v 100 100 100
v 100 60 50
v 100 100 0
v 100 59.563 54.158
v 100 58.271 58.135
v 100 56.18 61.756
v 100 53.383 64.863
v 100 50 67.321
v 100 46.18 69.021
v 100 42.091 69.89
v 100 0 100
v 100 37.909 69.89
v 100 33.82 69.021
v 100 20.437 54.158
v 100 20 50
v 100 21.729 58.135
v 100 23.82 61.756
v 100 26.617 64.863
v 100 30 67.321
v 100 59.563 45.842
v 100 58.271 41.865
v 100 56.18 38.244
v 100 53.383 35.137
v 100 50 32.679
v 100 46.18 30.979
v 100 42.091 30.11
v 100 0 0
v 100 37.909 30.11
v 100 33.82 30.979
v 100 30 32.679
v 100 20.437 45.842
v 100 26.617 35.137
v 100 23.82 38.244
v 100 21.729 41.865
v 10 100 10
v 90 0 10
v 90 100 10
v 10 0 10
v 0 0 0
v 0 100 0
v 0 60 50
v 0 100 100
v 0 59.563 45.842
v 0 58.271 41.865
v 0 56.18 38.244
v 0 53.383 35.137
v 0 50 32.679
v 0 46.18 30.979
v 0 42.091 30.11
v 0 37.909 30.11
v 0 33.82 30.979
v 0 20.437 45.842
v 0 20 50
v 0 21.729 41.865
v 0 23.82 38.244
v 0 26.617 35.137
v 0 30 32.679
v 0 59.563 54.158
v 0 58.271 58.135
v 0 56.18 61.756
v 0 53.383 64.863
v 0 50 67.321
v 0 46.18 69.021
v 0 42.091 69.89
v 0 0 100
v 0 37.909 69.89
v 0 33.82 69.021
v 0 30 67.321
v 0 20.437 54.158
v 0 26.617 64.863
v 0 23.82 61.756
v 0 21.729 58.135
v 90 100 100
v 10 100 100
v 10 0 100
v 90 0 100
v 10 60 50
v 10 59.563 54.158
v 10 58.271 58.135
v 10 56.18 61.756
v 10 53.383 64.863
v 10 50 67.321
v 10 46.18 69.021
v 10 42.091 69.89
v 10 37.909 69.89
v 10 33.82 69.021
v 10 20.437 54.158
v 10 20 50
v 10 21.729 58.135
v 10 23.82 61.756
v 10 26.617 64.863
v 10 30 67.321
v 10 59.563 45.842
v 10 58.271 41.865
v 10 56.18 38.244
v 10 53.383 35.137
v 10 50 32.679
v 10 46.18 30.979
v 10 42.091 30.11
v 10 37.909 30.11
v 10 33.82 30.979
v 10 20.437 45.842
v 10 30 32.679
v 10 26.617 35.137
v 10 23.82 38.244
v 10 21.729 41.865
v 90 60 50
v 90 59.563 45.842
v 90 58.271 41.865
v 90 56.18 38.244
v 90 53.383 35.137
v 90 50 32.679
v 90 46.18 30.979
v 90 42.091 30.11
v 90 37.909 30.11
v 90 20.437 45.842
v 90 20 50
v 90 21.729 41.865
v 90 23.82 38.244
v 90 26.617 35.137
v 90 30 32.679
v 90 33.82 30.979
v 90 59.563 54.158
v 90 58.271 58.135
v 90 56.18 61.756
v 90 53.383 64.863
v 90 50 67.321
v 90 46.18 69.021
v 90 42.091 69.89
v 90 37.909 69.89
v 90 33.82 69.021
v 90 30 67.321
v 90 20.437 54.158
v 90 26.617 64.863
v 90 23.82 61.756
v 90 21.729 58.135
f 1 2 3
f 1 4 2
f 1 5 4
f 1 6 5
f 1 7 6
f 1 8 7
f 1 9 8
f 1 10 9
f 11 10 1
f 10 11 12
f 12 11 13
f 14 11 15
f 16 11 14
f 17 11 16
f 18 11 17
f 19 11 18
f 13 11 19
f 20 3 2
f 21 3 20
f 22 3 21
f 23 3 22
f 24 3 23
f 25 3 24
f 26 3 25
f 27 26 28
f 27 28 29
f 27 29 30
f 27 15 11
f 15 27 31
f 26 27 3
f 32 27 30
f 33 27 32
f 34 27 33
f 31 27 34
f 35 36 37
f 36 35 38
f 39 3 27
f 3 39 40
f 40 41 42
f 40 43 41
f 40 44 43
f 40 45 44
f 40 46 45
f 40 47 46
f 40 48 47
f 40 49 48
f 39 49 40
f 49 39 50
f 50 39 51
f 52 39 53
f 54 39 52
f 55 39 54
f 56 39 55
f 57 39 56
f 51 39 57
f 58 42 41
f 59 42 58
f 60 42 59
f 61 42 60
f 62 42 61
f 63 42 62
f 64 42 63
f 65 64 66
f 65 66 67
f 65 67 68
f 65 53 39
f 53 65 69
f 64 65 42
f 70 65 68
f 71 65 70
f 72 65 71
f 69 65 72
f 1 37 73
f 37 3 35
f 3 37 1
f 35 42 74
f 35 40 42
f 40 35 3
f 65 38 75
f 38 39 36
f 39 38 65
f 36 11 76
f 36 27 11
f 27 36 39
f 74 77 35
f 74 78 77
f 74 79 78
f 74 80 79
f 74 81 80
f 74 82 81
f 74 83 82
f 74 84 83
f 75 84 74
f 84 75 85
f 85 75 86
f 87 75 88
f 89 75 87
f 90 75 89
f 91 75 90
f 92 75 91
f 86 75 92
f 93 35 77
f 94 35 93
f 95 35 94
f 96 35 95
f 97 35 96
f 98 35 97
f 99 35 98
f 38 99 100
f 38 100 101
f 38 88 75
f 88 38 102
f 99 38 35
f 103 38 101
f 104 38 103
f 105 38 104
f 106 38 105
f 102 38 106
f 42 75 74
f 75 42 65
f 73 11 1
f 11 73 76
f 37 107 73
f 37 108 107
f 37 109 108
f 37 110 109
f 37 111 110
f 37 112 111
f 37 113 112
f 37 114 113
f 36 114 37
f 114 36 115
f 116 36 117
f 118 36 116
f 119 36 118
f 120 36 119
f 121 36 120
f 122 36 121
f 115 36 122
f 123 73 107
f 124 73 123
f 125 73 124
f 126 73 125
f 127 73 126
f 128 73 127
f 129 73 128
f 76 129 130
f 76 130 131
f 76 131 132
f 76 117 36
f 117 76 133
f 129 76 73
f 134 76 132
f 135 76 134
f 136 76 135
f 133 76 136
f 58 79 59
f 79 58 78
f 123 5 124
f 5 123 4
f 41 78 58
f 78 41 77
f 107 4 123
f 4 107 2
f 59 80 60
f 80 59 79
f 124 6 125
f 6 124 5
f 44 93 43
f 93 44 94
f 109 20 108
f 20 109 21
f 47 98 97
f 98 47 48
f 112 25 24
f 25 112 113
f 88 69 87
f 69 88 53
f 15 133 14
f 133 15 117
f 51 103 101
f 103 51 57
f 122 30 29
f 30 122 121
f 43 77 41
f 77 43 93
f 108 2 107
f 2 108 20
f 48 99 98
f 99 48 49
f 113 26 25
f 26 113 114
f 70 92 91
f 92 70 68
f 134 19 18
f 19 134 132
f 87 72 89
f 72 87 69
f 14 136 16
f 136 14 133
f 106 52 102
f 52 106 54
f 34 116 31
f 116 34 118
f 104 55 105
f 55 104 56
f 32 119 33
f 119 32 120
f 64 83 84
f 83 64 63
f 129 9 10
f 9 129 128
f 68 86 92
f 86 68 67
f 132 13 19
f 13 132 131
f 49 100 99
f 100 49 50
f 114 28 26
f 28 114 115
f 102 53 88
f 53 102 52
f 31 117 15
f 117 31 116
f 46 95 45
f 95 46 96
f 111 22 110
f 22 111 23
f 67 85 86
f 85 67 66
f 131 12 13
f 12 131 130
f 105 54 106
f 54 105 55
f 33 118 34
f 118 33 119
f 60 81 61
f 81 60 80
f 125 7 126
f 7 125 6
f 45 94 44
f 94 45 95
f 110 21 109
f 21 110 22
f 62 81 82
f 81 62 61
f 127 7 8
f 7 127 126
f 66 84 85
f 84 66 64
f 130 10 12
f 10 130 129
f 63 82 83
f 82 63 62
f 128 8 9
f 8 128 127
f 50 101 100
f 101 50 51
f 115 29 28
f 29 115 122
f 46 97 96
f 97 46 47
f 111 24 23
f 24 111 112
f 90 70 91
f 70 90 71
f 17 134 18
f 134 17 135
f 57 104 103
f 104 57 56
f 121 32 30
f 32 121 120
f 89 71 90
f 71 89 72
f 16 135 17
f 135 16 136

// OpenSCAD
module base(height,width){
difference(){
union(){
cube([100,100,10]);
translate([0,0,0])cube([10,100,100]);
translate([90,0,0])cube([10,100,100]);
  }
  translate([-10,40,50]) rotate([90,0,90])  cylinder(r=20, h=120);
	}
}
base(1,10);
